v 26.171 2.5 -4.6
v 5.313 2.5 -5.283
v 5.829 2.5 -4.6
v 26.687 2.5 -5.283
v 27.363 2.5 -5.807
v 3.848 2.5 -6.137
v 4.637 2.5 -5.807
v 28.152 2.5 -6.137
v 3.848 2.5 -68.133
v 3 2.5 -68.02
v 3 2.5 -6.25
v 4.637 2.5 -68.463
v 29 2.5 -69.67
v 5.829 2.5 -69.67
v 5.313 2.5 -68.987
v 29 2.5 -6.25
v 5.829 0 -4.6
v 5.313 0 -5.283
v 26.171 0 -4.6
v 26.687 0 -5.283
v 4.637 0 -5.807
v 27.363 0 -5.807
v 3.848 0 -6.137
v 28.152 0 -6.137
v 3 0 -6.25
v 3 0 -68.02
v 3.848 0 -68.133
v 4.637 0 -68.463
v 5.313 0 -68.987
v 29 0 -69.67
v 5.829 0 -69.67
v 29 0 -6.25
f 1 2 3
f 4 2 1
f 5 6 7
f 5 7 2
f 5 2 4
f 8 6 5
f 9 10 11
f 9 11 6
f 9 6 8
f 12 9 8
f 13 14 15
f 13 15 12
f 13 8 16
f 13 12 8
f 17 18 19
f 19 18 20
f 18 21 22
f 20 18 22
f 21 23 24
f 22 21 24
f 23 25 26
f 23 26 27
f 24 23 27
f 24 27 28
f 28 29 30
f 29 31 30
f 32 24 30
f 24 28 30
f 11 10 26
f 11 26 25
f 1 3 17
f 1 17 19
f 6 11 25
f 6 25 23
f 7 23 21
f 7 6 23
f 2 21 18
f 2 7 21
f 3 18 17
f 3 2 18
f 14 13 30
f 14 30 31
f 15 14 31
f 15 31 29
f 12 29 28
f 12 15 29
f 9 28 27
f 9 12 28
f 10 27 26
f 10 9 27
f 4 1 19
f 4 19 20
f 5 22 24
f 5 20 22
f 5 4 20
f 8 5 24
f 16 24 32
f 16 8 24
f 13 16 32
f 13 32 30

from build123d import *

# Parameters (mm, degrees)
SKETCH_1_W          = 32
SKETCH_1_H          = 103
SKETCH_1_R          = 1.6
EXTRUDE_1_DEPTH     = 2.5
SKETCH_2_W          = 32
SKETCH_2_H          = 103
CUT_EXTRUDE_1_DEPTH = 108.885355818


with BuildPart() as part:
    # 草图1 → 凸台-拉伸1 (new body)
    with BuildSketch(Plane(origin=(0, 0, 0), x_dir=(1, 0, 0), z_dir=(0, 1, 0))):
        with Locations((16, 51.5)):
            Rectangle(SKETCH_1_W, SKETCH_1_H)
        with Locations(Location((3, 3, 0), (0, 0, 270))):
            Circle(SKETCH_1_R, mode=Mode.SUBTRACT)
        with Locations(Location((29, 3, 0), (0, 0, 270))):
            Circle(SKETCH_1_R, mode=Mode.SUBTRACT)
        with Locations(Location((3, 71.27, 0), (0, 0, 270))):
            Circle(SKETCH_1_R, mode=Mode.SUBTRACT)
        with Locations(Location((29, 100.07, 0), (0, 0, 270))):
            Circle(SKETCH_1_R, mode=Mode.SUBTRACT)
    extrude(amount=EXTRUDE_1_DEPTH)

    # 草图2 → 切除-拉伸1 (cut, through all)
    with BuildSketch(Plane(origin=(0, 2.5, 0), x_dir=(1, 0, 0), z_dir=(0, 1, 0))):
        with Locations((16, 51.5)):
            Rectangle(SKETCH_2_W, SKETCH_2_H)
        with BuildLine():
            Line((3, 68.02), (3, 6.25))
            ThreePointArc((3, 6.25), (4.637452289, 5.807356408), (5.828869032, 4.6))
            Line((5.828869032, 4.6), (26.171130968, 4.6))
            ThreePointArc((26.171130968, 4.6), (27.362547711, 5.807356408), (29, 6.25))
            Line((29, 6.25), (29, 69.67))
            Line((29, 69.67), (5.828869032, 69.67))
            ThreePointArc((5.828869032, 69.67), (4.637452289, 68.462643592), (3, 68.02))
        make_face(mode=Mode.SUBTRACT)
    extrude(amount=-CUT_EXTRUDE_1_DEPTH, mode=Mode.SUBTRACT)


solid = part.part
